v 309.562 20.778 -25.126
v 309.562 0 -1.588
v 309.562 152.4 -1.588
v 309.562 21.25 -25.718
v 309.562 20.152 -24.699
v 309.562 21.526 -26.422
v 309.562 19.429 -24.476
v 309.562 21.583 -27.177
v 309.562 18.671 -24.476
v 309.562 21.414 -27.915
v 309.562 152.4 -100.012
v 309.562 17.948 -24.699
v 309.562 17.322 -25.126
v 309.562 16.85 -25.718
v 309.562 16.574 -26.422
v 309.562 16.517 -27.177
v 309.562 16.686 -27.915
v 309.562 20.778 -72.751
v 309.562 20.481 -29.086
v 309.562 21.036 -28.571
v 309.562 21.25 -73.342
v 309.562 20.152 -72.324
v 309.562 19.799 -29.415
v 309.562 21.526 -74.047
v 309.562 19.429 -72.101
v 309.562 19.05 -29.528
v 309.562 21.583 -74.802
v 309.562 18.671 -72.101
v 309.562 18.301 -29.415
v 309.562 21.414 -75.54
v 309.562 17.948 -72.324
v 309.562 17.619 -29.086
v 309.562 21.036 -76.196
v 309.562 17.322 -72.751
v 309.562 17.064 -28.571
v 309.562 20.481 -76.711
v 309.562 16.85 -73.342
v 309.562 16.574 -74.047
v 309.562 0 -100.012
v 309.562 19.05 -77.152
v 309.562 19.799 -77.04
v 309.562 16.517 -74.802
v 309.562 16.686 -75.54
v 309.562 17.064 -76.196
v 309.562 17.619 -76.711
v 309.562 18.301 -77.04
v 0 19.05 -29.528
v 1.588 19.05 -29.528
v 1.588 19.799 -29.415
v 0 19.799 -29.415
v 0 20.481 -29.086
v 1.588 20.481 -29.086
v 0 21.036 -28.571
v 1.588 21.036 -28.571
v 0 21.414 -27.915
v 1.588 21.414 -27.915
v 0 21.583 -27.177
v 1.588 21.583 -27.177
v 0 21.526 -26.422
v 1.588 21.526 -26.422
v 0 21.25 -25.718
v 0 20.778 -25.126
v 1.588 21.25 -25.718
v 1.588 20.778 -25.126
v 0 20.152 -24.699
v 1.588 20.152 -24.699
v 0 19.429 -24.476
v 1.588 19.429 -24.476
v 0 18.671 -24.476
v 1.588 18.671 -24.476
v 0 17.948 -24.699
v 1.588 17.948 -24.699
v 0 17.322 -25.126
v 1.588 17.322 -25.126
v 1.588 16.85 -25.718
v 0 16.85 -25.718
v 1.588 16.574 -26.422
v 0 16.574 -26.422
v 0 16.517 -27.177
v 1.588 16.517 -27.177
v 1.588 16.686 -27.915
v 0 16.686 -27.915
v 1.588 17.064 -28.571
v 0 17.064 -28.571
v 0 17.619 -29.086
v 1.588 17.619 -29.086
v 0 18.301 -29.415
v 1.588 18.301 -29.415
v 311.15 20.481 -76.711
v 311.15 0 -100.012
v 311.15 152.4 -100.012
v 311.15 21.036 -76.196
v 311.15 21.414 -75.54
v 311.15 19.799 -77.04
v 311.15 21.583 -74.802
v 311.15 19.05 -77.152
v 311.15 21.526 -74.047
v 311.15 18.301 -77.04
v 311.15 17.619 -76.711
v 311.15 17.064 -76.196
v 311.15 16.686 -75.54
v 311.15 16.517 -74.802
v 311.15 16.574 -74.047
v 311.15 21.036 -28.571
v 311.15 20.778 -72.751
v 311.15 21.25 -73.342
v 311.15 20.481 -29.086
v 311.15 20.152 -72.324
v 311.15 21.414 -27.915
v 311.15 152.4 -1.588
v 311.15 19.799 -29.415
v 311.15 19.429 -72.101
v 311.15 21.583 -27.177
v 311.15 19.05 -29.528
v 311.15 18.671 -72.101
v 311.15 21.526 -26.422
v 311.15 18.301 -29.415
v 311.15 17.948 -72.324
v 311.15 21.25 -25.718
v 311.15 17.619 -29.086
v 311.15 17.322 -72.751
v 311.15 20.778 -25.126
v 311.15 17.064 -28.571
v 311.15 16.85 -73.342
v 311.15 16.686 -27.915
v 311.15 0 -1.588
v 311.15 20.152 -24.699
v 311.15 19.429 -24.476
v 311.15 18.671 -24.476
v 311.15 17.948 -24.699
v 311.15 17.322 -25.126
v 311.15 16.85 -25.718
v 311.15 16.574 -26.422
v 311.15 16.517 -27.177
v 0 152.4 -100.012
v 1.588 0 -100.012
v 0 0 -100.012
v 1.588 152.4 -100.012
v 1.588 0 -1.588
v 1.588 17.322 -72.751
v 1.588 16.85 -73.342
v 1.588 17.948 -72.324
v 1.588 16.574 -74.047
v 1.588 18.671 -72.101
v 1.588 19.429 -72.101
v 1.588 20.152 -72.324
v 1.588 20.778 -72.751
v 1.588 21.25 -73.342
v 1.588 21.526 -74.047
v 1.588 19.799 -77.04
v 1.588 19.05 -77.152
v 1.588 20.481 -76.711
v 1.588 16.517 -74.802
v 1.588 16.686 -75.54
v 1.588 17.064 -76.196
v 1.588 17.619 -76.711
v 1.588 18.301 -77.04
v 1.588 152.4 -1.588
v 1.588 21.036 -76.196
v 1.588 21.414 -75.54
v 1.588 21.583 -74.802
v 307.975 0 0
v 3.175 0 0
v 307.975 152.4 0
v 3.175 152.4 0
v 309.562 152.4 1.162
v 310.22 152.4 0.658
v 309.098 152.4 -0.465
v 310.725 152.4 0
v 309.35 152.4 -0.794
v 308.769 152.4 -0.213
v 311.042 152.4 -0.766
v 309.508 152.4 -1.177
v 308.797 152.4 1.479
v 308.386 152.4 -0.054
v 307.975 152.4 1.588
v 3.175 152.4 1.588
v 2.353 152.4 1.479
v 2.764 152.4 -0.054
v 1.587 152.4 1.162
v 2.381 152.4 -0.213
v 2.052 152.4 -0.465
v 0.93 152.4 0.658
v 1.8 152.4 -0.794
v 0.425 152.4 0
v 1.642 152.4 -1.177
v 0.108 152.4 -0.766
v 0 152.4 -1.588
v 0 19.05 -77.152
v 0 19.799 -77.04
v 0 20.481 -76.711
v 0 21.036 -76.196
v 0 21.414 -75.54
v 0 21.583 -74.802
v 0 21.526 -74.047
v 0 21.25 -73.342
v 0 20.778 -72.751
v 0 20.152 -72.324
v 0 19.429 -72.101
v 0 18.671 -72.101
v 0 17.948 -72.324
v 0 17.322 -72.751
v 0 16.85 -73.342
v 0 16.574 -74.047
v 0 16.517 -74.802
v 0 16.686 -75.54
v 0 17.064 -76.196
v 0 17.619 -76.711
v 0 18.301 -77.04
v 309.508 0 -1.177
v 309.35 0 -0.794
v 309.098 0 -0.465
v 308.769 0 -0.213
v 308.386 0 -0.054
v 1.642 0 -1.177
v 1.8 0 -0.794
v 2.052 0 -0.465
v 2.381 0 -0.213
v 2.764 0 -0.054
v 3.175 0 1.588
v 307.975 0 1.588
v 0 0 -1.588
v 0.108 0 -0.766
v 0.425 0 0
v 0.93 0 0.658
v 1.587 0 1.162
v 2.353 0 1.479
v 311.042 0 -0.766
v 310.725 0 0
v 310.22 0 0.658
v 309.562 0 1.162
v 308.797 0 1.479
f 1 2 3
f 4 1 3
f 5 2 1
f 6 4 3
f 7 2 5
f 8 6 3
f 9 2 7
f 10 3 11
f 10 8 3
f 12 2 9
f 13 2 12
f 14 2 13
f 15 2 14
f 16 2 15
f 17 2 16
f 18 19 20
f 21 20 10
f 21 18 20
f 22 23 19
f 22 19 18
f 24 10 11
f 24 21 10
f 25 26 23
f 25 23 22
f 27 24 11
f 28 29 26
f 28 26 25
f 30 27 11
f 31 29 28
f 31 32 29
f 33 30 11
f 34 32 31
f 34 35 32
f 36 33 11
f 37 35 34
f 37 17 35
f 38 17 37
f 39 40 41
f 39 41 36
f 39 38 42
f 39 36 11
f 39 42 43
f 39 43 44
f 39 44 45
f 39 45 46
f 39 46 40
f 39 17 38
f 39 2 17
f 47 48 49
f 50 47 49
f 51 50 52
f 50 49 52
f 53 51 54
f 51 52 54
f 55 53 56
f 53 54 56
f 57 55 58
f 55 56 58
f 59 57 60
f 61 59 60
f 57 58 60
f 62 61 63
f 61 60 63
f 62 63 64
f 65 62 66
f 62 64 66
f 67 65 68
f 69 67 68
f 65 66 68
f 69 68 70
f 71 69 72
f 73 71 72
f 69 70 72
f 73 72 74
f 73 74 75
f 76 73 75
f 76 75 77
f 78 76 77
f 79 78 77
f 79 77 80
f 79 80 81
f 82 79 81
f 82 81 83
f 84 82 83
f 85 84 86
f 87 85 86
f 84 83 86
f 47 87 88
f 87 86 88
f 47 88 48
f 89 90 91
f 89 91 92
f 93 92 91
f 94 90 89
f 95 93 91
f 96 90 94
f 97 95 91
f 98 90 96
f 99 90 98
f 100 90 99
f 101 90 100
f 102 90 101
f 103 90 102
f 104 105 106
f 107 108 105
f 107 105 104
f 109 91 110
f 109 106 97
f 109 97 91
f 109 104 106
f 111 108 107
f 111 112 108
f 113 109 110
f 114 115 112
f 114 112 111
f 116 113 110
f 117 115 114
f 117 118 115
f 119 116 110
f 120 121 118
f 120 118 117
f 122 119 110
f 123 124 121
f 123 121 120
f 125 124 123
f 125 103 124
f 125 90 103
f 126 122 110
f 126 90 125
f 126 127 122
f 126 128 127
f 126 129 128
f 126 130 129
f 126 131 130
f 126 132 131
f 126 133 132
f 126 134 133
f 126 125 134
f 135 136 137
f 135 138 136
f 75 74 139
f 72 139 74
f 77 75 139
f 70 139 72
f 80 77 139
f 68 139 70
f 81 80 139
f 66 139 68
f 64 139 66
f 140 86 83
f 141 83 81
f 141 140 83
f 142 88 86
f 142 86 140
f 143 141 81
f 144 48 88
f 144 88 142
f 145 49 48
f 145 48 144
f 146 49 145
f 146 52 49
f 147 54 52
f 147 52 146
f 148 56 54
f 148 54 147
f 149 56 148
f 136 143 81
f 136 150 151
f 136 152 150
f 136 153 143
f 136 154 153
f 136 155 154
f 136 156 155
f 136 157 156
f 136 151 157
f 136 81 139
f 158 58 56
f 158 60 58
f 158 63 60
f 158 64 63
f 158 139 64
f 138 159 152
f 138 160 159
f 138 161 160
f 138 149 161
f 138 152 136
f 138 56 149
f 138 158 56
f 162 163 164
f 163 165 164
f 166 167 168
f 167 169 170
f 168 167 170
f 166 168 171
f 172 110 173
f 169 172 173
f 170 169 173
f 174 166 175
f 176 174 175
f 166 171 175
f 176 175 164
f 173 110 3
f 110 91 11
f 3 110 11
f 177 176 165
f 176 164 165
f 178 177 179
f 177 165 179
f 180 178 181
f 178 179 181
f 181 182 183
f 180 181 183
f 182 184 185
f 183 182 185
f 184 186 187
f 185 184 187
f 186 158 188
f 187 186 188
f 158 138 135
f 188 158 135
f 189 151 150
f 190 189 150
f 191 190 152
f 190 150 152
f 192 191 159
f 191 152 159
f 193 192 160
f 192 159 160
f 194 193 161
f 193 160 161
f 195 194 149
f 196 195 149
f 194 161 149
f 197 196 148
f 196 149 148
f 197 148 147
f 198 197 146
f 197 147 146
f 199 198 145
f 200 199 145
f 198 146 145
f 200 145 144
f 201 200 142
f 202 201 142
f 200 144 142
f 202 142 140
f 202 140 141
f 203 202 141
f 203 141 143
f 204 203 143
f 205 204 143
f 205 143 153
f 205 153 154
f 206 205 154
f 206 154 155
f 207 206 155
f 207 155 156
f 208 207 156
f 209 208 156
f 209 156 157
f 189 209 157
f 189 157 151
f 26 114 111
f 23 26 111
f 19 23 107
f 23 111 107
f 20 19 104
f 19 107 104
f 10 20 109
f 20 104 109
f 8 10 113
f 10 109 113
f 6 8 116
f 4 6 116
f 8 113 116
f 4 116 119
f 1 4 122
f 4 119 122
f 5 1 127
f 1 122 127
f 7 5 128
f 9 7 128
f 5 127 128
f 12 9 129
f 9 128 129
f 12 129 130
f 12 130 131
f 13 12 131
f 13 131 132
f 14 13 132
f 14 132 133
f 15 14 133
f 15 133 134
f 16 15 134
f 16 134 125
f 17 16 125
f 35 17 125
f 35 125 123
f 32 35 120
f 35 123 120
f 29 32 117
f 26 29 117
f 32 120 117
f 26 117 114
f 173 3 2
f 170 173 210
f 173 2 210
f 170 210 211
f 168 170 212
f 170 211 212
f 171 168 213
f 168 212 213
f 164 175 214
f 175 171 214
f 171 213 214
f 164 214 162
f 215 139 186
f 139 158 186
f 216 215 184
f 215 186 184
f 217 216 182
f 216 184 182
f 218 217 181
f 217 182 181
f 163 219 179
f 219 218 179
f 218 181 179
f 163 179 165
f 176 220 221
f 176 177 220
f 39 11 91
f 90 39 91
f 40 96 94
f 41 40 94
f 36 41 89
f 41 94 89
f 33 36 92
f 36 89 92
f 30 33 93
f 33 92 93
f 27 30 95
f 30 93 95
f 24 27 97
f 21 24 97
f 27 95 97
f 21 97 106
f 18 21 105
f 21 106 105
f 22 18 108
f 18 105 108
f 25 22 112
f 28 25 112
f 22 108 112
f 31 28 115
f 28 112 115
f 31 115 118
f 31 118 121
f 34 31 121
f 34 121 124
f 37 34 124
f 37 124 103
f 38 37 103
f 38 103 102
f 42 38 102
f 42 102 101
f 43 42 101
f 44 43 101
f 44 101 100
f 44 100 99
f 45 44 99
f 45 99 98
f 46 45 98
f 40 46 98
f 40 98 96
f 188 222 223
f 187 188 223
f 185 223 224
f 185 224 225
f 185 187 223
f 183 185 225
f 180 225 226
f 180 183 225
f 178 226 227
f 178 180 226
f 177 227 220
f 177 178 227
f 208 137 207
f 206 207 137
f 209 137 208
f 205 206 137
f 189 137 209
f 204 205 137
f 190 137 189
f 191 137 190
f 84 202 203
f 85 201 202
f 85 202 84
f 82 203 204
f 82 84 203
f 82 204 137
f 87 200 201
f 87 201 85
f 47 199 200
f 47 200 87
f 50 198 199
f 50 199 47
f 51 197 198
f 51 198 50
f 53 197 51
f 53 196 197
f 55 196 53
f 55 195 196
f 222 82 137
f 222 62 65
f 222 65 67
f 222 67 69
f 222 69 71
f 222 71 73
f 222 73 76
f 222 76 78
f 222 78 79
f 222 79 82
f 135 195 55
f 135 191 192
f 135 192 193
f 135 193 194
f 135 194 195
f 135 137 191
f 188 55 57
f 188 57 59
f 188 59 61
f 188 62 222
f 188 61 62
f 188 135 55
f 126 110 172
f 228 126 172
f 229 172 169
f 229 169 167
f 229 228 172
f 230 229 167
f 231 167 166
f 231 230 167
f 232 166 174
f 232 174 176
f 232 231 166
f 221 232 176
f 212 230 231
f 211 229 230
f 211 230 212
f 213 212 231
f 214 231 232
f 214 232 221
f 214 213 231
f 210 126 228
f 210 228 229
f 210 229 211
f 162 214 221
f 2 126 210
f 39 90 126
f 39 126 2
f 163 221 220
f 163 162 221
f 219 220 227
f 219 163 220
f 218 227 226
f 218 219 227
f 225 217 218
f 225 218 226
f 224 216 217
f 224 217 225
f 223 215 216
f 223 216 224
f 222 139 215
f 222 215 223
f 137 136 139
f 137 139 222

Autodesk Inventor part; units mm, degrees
ref_plane "YZ Plane" through (0, 0, 0) normal (1, 0, 0) x (0, 1, 0)
ref_plane "XZ Plane" through (0, 0, 0) normal (0, 1, 0) x (-1, 0, 0)
ref_plane "XY Plane" through (0, 0, 0) normal (0, 0, 1) x (1, 0, 0)
sketch "Sketch1" plane through (0, 0, 0) normal (0, 0, 1) x (1, 0, 0)
  line L0 (0, 0) -> (311.15, 0)
  line L1 (311.15, 0) -> (311.15, 152.4)
  line L2 (311.15, 152.4) -> (0, 152.4)
  line L3 (0, 152.4) -> (0, 0)
  dimension "d0" = 311.15
  dimension "d1" = 152.4
extrude "Plate1" add sketch "Sketch1" along normal blind 1.5875
sketch "Sketch2" plane through (309.5625, 0, 1.5875) normal (1, 0, 0) x (0, 1, 0)
  line L0 (152.4, 0) -> (0, 0)
  line L1 (0, 0) -> (0, -101.6)
  line L2 (0, -101.6) -> (152.4, -101.6)
  line L3 (152.4, -101.6) -> (152.4, 0)
edge flange "Flange1" height 101.6 angle 90 thickness 1.5875 bend radius 1.5875 thickness toward (1, 0, 0) relief straight relief width 1.5875 relief depth 0.7937 corner gap 1.5875 corner form 0 edges at (311.15, 76.2, 0) (0, 76.2, 0) wall of the first edge with corners at (309.5625, 152.4, 1.5875) (309.5625, 0, 1.5875) (309.5625, 0, -100.0125) (309.5625, 152.4, -100.0125)
bend "Bend1"
corner "Corner1"
sketch "Sketch3" plane through (311.15, 0, -100.0125) normal (1, 0, 0) x (0, 0, -1)
  circle A0 centre (-73.025, 19.05) radius 2.54
  circle A1 centre (-25.4, 19.05) radius 2.54
  line L0 (0, 152.4) -> (0, 0) projected
  line L1 (-98.425, 152.4) -> (-98.425, 0) projected
  line L2 (0, 0) -> (-98.425, 0) projected
  point P0 (-100.0125, 0)
  dimension "d13" = 5.08
  dimension "d14" = 5.08
  dimension "d15" = 25.4
  dimension "d16" = 25.4
  dimension "d17" = 19.05
  dimension "d18" = 19.05
extrude "Extrusion1" cut sketch "Sketch3" against normal up to surface (311.15 mm away)
equation "\"d3\" = BendReliefWidth"
equation "\"d4\" = BendReliefDepth"
equation "\"d5\" = MinimumRemnant"
equation "\"d6\" = BendRadius"
equation "\"d9\" = BendRadius"
equation "\"d10\" = CornerReliefSize"
equation "\"d11\" = GapSize"
equation "\"d12\" = JacobiRadiusSize"
equation "\"BendRadius\" = Thickness"
equation "\"BendReliefWidth\" = Thickness"
equation "\"BendReliefDepth\" = 0.5 * Thickness"
equation "\"CornerReliefSize\" = 4 * Thickness"
equation "\"MinimumRemnant\" = 2 * Thickness"
equation "\"TransitionRadius\" = BendRadius"
equation "\"JacobiRadiusSize\" = Thickness"
equation "\"GapSize\" = Thickness"
equation "\"d2\" = BendRadius"
equation "\"Thickness\" = 1.5875"
properties part number "Chute"
